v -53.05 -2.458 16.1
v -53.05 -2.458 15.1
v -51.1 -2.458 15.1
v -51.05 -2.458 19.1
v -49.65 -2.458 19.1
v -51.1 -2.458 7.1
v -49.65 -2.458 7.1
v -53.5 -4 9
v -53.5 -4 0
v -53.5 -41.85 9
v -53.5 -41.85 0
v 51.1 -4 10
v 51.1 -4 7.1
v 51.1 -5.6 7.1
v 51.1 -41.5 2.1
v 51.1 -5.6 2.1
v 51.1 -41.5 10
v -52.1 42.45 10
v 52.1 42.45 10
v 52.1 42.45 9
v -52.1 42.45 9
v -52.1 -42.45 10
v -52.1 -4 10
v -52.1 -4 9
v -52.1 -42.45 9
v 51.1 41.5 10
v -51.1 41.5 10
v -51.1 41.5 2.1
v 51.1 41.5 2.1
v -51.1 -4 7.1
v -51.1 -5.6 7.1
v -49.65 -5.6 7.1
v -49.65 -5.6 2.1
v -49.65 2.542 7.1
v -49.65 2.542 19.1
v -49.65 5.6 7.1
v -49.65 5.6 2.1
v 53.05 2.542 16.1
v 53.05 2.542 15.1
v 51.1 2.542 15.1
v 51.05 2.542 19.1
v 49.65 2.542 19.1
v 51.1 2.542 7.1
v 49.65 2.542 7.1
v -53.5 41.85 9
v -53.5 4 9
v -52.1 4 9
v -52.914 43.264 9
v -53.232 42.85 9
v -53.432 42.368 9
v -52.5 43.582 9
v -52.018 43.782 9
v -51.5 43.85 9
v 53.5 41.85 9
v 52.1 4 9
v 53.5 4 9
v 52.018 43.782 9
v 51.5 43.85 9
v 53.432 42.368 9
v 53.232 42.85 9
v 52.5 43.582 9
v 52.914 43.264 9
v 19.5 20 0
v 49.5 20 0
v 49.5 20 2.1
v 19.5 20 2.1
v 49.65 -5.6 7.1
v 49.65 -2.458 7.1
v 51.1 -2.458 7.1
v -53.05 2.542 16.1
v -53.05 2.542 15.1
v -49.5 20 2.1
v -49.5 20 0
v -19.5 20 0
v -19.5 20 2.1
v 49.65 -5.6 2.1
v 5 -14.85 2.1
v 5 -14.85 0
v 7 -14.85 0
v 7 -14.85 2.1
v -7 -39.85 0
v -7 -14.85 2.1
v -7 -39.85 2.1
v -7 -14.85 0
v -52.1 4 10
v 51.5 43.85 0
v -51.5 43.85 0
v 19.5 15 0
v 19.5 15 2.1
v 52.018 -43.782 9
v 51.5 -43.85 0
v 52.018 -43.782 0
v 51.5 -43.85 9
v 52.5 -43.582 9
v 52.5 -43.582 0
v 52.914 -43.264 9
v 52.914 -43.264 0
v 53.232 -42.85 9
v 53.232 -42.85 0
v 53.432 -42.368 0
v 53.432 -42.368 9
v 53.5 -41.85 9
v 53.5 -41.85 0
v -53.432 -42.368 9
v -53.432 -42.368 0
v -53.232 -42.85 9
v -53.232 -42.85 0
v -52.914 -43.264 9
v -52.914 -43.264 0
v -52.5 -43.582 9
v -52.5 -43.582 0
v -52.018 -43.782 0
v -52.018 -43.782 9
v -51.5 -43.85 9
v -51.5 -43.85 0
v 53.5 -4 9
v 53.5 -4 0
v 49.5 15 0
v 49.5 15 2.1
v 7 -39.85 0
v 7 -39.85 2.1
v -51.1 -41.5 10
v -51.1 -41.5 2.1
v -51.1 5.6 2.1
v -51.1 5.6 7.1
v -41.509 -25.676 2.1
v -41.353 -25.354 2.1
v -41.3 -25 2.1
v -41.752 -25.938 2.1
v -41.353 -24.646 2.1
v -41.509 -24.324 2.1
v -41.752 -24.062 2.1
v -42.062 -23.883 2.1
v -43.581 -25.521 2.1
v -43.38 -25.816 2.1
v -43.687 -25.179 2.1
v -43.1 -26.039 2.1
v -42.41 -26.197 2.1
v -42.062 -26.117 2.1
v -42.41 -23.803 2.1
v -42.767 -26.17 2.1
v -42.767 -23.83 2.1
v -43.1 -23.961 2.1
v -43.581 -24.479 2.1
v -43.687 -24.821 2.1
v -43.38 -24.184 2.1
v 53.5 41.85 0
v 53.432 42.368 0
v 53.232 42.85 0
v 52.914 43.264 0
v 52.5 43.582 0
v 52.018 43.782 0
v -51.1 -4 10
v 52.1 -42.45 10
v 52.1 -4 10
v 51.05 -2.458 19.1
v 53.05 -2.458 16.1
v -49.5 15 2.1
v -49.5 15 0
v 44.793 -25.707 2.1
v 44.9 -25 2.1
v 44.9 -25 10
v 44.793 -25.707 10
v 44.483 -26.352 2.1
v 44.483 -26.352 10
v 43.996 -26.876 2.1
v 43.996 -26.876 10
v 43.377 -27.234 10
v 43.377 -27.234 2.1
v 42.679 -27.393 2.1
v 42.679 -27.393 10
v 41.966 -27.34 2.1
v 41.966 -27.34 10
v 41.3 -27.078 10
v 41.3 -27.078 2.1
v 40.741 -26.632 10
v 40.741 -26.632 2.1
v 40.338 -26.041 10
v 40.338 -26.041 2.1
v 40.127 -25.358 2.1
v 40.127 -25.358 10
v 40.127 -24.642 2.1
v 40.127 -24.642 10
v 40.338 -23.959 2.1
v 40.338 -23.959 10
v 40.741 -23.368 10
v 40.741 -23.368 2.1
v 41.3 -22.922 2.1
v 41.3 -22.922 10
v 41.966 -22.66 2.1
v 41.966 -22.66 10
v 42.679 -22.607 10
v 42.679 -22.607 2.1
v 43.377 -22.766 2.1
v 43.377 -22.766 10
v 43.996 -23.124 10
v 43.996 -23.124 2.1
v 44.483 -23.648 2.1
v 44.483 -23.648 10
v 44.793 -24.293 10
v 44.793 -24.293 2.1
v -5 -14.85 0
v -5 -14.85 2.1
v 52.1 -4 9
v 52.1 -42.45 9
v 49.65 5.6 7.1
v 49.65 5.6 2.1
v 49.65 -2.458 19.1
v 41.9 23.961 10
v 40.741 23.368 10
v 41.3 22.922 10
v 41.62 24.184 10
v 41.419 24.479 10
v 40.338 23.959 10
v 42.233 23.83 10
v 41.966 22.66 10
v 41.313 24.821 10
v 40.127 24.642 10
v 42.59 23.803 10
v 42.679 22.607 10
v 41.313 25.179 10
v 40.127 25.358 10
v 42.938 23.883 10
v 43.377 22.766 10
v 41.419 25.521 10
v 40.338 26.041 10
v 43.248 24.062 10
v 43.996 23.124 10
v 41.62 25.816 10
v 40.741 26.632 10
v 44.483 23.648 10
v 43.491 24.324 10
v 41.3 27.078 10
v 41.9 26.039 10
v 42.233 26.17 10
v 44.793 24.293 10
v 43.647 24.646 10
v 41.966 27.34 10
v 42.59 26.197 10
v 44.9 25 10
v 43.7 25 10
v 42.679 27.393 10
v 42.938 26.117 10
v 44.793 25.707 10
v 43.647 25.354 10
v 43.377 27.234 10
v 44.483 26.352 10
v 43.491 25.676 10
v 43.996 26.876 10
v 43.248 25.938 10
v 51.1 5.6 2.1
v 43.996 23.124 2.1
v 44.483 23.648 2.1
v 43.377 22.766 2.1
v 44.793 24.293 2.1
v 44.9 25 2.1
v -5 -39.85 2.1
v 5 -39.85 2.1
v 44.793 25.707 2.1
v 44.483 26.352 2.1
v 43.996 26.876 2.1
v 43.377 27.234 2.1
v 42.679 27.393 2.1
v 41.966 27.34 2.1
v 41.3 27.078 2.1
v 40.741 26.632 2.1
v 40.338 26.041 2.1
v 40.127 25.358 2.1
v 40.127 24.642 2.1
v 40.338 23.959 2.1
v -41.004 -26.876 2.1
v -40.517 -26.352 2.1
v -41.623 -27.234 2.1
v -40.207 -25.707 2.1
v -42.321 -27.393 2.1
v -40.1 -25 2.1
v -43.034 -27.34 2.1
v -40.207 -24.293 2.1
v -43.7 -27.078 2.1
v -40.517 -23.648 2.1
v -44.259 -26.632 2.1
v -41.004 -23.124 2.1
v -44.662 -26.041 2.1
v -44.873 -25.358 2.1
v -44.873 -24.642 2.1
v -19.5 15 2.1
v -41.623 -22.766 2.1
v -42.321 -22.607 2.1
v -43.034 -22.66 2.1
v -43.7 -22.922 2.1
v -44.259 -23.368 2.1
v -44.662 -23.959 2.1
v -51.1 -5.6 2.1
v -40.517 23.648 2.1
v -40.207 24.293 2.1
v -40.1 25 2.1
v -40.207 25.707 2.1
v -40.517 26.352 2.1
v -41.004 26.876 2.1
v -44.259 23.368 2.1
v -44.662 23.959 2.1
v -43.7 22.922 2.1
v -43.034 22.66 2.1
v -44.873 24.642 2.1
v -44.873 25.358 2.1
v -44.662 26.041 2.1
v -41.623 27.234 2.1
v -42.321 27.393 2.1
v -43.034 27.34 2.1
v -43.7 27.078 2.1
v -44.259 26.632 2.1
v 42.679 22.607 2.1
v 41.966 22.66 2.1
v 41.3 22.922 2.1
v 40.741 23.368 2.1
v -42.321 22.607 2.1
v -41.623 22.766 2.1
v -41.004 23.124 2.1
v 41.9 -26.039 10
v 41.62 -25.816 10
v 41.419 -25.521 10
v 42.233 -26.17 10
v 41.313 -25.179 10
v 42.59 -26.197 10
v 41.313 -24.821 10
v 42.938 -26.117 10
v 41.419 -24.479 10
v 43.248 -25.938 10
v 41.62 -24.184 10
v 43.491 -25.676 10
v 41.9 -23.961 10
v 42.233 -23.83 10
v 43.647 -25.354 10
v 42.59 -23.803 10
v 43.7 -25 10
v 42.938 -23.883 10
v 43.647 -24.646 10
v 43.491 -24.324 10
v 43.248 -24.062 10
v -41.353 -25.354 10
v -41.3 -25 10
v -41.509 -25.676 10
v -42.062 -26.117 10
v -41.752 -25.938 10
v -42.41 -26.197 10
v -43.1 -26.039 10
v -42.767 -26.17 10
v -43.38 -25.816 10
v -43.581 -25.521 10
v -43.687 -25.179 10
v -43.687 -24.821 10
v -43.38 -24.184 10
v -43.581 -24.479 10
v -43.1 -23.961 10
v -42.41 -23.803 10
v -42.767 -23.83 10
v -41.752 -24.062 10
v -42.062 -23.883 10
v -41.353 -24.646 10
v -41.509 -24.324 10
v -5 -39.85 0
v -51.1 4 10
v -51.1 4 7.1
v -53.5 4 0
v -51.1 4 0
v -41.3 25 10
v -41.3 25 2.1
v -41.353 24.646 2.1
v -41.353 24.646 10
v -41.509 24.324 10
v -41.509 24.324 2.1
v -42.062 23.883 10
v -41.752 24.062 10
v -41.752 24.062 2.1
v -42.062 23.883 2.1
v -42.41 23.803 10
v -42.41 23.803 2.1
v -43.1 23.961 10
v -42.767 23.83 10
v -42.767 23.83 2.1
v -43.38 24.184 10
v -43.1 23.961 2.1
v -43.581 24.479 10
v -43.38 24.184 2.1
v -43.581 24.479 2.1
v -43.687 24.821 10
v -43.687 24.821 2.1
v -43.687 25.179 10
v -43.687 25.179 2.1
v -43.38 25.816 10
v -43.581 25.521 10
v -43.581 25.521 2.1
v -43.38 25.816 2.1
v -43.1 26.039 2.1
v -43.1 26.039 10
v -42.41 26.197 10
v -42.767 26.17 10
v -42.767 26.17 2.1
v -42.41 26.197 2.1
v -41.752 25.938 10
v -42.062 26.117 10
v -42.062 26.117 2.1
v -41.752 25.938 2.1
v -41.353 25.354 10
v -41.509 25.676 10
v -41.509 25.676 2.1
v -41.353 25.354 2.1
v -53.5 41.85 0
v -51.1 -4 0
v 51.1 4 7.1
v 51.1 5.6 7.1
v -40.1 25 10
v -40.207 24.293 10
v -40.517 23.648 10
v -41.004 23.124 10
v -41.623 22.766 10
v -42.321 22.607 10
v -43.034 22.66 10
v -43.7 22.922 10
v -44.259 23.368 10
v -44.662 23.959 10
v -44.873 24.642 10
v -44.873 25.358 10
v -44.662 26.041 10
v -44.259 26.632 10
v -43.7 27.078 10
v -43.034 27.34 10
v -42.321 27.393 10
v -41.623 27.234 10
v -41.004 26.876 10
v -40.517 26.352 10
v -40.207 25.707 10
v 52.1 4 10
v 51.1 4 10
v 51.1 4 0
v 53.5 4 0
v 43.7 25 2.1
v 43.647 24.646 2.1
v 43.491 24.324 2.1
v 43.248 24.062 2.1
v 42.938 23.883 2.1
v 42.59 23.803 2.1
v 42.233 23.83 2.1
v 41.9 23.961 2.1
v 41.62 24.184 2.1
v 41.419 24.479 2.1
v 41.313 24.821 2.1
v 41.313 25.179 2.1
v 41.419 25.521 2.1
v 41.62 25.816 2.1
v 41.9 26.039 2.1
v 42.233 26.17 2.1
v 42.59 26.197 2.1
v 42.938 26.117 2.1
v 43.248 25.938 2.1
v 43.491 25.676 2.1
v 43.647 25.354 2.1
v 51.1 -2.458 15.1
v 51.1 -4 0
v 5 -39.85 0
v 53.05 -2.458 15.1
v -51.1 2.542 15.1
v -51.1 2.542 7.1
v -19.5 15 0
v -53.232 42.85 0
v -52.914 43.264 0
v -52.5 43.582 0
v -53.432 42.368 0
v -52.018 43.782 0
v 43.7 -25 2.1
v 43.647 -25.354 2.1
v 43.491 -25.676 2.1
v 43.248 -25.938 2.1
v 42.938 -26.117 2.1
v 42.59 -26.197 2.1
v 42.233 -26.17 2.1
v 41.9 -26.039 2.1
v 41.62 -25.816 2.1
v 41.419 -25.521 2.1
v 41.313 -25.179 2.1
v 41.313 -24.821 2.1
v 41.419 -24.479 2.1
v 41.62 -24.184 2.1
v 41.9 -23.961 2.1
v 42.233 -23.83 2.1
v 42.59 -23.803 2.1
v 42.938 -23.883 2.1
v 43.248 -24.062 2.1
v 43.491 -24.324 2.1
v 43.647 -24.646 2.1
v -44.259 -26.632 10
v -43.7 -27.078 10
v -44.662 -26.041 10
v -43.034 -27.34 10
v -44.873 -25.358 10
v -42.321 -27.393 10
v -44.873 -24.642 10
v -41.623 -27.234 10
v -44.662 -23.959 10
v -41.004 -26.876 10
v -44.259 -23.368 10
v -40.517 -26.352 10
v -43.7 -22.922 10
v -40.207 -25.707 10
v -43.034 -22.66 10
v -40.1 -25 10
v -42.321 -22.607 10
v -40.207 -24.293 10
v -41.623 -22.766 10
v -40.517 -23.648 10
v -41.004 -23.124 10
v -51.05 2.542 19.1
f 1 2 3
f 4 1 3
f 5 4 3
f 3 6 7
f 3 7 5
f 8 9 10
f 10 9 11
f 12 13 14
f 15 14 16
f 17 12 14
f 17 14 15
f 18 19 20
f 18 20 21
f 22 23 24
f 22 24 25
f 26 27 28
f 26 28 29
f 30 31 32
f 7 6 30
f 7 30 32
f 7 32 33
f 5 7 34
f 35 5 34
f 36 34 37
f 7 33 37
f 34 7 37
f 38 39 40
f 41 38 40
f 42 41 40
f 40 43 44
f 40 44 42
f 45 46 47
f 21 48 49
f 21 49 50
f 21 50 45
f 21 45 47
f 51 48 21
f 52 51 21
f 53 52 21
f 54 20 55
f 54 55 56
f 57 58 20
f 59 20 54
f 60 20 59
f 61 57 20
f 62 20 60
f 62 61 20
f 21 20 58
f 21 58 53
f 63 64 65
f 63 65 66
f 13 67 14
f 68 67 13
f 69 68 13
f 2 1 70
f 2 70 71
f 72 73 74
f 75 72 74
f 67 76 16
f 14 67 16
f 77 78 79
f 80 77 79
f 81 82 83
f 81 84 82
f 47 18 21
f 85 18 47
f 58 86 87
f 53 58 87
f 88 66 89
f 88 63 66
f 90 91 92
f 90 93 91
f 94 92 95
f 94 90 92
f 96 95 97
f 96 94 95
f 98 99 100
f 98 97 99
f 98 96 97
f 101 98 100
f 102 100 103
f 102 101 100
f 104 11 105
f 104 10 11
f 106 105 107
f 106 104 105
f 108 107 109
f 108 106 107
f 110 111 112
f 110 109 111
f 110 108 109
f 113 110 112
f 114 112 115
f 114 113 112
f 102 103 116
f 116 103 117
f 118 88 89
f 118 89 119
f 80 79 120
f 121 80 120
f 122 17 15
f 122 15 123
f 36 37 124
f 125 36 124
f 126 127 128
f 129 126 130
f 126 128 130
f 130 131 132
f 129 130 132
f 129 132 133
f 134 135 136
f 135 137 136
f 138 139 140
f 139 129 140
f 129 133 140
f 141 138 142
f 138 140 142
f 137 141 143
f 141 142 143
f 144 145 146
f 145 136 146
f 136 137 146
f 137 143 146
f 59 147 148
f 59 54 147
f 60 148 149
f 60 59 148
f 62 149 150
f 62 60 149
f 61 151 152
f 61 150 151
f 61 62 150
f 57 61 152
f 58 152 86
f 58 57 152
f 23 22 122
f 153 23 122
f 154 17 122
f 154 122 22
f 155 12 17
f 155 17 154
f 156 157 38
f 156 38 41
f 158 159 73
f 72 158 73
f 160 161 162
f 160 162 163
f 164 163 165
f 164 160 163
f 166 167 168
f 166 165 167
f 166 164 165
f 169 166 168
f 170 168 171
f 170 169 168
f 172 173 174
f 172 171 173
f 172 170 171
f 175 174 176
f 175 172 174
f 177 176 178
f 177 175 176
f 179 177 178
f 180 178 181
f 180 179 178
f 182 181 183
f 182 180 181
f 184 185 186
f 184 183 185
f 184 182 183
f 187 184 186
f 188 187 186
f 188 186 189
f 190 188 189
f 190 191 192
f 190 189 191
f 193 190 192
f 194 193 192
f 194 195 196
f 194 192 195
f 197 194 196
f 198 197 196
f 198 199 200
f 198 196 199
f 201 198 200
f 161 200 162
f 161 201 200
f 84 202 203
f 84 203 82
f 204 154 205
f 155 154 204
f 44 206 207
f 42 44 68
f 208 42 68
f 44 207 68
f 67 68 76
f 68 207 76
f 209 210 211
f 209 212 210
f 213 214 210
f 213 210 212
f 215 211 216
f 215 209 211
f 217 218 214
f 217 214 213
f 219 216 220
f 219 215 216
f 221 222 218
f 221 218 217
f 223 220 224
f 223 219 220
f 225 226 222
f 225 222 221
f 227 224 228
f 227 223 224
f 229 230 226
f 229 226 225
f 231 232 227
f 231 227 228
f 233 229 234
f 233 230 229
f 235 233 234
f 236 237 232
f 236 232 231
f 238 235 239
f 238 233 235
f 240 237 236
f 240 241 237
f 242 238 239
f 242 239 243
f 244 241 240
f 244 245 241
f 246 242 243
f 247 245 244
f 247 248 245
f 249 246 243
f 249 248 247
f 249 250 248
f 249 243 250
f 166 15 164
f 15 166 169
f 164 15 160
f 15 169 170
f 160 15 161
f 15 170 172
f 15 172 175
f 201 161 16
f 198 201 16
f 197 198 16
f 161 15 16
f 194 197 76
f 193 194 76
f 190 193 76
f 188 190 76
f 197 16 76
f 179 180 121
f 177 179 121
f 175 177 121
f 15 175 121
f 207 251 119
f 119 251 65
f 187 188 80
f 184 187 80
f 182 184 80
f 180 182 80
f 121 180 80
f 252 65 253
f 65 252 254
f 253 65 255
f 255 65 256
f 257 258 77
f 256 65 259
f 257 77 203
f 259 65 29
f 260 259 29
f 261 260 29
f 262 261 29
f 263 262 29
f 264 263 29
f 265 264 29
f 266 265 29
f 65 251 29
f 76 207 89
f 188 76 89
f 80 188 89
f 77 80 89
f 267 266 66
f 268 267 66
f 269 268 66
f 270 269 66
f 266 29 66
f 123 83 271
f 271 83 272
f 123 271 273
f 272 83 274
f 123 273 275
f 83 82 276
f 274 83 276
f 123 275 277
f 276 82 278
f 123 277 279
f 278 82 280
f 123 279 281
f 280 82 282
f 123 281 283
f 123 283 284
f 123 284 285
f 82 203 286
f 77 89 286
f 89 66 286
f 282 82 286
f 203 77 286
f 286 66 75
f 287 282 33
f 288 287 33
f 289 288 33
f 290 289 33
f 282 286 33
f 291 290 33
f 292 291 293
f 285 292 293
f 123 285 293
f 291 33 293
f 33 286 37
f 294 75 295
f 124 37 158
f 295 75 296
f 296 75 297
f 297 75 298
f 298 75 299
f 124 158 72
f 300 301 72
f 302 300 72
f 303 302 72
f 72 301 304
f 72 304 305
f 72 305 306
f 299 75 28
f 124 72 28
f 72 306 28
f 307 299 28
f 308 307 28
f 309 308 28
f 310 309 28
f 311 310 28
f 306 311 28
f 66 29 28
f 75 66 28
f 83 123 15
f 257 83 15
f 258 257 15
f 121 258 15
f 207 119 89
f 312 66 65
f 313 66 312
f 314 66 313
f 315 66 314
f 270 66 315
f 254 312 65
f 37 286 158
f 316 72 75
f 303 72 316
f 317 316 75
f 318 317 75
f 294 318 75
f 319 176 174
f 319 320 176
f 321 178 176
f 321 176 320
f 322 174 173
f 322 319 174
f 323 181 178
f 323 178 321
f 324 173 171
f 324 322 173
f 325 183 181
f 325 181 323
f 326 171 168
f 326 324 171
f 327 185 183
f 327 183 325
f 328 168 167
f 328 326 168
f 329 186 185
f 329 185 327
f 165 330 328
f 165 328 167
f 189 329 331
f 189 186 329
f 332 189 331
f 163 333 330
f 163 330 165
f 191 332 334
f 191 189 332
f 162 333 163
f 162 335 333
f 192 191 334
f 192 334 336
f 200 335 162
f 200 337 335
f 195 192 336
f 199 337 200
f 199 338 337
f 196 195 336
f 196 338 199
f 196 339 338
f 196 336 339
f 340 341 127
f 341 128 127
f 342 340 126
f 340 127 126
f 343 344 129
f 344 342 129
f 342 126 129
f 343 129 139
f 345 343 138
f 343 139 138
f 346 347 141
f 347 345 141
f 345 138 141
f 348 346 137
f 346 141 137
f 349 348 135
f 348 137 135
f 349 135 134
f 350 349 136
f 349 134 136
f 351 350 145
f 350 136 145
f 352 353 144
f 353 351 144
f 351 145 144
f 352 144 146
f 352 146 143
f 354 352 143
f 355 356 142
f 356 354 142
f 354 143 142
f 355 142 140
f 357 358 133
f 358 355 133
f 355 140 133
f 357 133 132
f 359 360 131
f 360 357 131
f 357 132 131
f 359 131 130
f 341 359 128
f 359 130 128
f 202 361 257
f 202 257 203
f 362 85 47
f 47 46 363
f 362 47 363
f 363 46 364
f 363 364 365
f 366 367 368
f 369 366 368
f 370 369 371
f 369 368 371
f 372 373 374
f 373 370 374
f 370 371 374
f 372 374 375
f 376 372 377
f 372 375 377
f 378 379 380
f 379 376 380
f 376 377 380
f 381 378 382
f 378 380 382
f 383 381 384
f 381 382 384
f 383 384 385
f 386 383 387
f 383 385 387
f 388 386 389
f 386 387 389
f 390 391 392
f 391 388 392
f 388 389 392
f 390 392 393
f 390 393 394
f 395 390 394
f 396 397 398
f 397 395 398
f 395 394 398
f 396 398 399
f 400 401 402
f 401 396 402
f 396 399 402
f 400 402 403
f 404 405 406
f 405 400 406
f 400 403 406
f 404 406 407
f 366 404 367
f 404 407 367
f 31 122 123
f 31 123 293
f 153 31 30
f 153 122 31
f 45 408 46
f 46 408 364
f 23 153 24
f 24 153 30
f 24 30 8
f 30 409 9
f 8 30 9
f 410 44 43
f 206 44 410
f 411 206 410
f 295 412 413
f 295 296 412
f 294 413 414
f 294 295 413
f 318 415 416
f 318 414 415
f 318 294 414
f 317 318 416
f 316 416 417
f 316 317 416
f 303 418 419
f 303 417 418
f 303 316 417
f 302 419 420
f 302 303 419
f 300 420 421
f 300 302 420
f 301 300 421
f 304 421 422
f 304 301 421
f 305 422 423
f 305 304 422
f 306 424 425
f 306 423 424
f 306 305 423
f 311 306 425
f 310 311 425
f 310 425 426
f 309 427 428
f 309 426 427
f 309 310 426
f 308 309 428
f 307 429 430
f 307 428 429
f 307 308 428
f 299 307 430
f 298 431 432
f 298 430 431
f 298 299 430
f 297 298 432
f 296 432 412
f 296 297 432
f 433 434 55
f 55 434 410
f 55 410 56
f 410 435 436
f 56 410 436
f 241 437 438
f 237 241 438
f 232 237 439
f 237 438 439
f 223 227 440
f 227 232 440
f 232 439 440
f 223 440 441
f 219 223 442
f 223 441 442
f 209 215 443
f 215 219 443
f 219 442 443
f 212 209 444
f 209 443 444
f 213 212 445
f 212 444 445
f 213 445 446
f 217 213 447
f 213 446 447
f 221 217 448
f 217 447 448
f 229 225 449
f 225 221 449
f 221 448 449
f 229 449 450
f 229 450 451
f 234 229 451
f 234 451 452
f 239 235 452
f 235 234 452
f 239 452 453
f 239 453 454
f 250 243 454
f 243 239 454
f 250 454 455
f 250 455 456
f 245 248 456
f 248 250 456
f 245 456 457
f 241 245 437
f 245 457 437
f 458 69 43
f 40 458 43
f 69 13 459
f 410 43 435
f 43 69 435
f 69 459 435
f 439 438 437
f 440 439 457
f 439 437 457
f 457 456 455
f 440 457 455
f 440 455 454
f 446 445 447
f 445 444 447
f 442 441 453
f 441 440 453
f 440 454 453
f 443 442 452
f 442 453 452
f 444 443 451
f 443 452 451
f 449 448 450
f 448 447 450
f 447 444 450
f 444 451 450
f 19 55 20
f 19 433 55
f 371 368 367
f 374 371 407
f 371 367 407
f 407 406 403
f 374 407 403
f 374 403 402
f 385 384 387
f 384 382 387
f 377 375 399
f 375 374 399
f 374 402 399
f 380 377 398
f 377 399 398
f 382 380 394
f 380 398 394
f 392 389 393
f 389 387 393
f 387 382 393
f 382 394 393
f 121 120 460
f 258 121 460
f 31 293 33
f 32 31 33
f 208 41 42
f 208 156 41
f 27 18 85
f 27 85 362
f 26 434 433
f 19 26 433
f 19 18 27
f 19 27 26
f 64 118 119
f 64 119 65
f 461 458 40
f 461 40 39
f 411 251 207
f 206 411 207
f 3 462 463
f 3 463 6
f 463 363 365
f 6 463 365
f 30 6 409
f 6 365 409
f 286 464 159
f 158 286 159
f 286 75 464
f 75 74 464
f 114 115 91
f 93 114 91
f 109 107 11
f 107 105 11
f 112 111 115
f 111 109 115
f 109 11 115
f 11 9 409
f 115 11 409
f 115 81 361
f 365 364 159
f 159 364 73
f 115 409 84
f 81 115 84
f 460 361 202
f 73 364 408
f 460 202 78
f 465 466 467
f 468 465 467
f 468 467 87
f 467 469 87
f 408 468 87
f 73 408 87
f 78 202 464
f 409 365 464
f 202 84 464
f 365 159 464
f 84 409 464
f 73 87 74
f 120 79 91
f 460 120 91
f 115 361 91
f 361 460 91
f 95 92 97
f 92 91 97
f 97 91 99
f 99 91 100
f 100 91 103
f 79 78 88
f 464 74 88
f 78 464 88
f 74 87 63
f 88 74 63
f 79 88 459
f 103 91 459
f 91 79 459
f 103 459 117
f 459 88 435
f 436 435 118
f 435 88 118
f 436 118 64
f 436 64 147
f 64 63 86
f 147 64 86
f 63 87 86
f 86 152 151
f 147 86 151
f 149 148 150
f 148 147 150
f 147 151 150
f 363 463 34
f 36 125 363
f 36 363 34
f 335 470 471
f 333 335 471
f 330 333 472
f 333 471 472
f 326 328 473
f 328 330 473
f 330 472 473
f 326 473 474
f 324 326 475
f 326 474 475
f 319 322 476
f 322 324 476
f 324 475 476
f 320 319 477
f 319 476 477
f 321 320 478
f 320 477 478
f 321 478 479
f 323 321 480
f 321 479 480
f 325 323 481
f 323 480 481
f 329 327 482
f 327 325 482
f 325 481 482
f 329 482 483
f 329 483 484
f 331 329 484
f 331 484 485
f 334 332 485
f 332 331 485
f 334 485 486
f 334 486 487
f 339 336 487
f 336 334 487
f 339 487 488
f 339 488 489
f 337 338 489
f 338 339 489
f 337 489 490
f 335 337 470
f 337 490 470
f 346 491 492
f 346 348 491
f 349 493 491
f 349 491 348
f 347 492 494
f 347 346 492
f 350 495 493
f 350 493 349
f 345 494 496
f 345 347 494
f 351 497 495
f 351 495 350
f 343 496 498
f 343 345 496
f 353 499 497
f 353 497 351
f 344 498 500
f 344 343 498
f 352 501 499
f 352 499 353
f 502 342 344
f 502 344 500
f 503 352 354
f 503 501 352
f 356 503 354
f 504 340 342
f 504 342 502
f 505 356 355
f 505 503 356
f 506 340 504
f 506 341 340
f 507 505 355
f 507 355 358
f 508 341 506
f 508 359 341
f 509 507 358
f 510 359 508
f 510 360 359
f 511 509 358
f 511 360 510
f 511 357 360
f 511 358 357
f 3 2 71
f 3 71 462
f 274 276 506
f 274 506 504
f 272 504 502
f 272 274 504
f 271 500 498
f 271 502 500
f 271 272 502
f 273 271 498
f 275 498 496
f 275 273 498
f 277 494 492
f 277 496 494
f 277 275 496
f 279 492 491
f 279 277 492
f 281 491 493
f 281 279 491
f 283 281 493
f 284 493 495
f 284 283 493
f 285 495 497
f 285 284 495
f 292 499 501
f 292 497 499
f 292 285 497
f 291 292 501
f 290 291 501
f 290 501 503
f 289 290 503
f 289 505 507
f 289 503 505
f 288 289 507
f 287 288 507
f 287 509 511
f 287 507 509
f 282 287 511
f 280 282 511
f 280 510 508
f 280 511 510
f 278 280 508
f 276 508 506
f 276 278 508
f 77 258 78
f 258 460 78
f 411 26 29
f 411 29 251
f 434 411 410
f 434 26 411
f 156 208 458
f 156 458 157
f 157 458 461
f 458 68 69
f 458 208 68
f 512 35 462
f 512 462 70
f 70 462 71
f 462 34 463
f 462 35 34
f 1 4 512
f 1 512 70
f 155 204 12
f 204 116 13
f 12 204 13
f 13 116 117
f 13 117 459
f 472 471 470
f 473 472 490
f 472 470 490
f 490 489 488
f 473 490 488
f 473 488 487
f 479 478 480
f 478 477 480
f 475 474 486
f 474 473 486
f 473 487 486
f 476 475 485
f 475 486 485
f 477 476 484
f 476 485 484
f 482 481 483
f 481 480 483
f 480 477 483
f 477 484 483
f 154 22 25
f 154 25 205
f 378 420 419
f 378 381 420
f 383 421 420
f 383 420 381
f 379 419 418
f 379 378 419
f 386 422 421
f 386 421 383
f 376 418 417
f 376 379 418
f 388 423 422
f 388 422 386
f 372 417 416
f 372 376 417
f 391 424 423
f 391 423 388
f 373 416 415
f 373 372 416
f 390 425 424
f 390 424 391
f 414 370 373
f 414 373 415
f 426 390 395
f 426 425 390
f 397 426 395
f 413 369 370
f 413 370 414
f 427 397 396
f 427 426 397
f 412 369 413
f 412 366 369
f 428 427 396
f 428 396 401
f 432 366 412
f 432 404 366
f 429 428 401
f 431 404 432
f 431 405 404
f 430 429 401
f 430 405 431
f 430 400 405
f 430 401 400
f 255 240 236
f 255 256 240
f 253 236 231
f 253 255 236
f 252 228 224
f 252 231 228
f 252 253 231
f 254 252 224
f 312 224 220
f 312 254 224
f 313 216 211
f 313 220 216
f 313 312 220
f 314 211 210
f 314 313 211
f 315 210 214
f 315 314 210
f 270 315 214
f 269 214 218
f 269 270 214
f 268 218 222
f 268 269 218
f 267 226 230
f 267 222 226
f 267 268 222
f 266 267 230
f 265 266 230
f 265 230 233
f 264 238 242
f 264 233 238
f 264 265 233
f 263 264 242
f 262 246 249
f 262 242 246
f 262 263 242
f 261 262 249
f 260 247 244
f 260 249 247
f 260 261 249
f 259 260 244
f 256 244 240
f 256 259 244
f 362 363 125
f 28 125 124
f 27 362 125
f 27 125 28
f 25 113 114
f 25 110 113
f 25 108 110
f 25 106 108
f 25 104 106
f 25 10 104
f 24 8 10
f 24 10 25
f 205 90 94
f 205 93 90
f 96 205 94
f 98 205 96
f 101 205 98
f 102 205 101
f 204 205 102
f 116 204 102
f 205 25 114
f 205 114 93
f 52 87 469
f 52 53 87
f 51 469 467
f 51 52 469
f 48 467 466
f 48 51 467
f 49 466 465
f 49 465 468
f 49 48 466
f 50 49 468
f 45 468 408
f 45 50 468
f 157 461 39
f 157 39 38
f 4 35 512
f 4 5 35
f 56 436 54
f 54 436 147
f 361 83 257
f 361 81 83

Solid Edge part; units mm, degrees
sketch "Sketch1" plane through (0, 0, 0) normal (0, 0, 1) x (1, 0, 0)
  line L0 (19.5, 20) -> (19.5, 15)
  line L1 (19.5, 15) -> (49.5, 15)
  line L2 (49.5, 15) -> (49.5, 20)
  line L3 (49.5, 20) -> (19.5, 20)
  line L4 (-7, -39.85) -> (-5, -39.85)
  line L5 (-5, -39.85) -> (-5, -14.85)
  line L6 (-5, -14.85) -> (-7, -14.85)
  line L7 (-7, -14.85) -> (-7, -39.85)
  line L8 (53.5, 43.85) -> (-53.5, 43.85)
  line L9 (-53.5, 43.85) -> (-53.5, -43.85)
  line L10 (-53.5, -43.85) -> (53.5, -43.85)
  line L11 (53.5, -43.85) -> (53.5, 43.85)
  line L12 (7, -39.85) -> (5, -39.85)
  line L13 (5, -39.85) -> (5, -14.85)
  line L14 (5, -14.85) -> (7, -14.85)
  line L15 (7, -14.85) -> (7, -39.85)
  line L16 (-49.5, 20) -> (-19.5, 20)
  line L17 (-19.5, 20) -> (-19.5, 15)
  line L18 (-19.5, 15) -> (-49.5, 15)
  line L19 (-49.5, 15) -> (-49.5, 20)
  dimension "D1" = 87.7
  dimension "D2" = 107
  dimension "D3" = 4
  dimension "D4" = 25
  dimension "D5" = 5
  dimension "D6" = 2
  dimension "D7" = 30
  dimension "D8" = 5
  dimension "D9" = 4
  dimension "D10" = 15
extrude "ExtrudedProtrusion_2" add sketch "Sketch1" along normal blind 10
sketch "Sketch2" plane through (0, 0, 10) normal (0, 0, 1) x (0, 1, 0)
  line L0 (41.5, -51.1) -> (-41.5, -51.1)
  line L1 (-41.5, -51.1) -> (-41.5, 51.1)
  line L2 (-41.5, 51.1) -> (41.5, 51.1)
  line L3 (41.5, 51.1) -> (41.5, -51.1)
  line L4 (-39.85, -7) -> (-39.85, -5)
  line L5 (-39.85, -5) -> (-14.85, -5)
  line L6 (-14.85, -5) -> (-14.85, -7)
  line L7 (-14.85, -7) -> (-39.85, -7)
  line L8 (15, 49.5) -> (20, 49.5)
  line L9 (20, 49.5) -> (20, 19.5)
  line L10 (20, 19.5) -> (15, 19.5)
  line L11 (15, 19.5) -> (15, 49.5)
  line L12 (-14.85, 5) -> (-14.85, 7)
  line L13 (-14.85, 7) -> (-39.85, 7)
  line L14 (-39.85, 7) -> (-39.85, 5)
  line L15 (-39.85, 5) -> (-14.85, 5)
  line L16 (15, -49.5) -> (20, -49.5)
  line L17 (20, -49.5) -> (20, -19.5)
  line L18 (20, -19.5) -> (15, -19.5)
  line L19 (15, -19.5) -> (15, -49.5)
extrude "ExtrudedCutout_1" cut sketch "Sketch2" against normal blind 7.9
sketch "Sketch3" plane through (0, 0, 10) normal (0, 0, 1) x (1, 0, 0)
  line L0 (-52.1, 42.45) -> (-52.1, -42.45)
  line L1 (-52.1, -42.45) -> (52.1, -42.45)
  line L2 (52.1, -42.45) -> (52.1, 42.45)
  line L3 (52.1, 42.45) -> (-52.1, 42.45)
  line L4 (53.5, 43.85) -> (-53.5, 43.85)
  line L5 (-53.5, 43.85) -> (-53.5, -43.85)
  line L6 (-53.5, -43.85) -> (53.5, -43.85)
  line L7 (53.5, -43.85) -> (53.5, 43.85)
  dimension "D1" = 104.2
  dimension "D2" = 84.9
  dimension "D3" = 87.7
  dimension "D4" = 107
extrude "ExtrudedCutout_2" cut sketch "Sketch3" against normal blind 1
sketch "Sketch4" plane through (0, 0, 2.1) normal (0, 0, 1) x (1, 0, 0)
  line L0 (-49.65, -5.6) -> (-49.65, 5.6)
  line L1 (-49.65, 5.6) -> (-51.1, 5.6)
  line L2 (-51.1, 5.6) -> (-51.1, -5.6)
  line L3 (-51.1, -5.6) -> (-49.65, -5.6)
extrude "ExtrudedProtrusion_3" add sketch "Sketch4" along normal blind 5
mirror "Mirror1" about plane through (0, 0, 0) normal (1, 0, 0) of "ExtrudedProtrusion_3"
sketch "Sketch5" plane through (-50.375, 0, 7.1) normal (0, 0, 1) x (0, 1, 0)
  line L0 (-2.4577, -0.725) -> (2.5423, -0.725)
  line L1 (2.5423, -0.725) -> (2.5423, 0.725)
  line L2 (2.5423, 0.725) -> (-2.4577, 0.725)
  line L3 (-2.4577, 0.725) -> (-2.4577, -0.725)
extrude "ExtrudedProtrusion_4" add sketch "Sketch5" along normal blind 8
mirror "Mirror2" about plane through (0, 0, 0) normal (1, 0, 0) of "ExtrudedProtrusion_4"
sketch "Sketch6" plane through (-50.375, -2.4577, 11.1) normal (0, -1, 0) x (0, 0, 1)
  line L0 (4, 2.675) -> (4, -0.725)
  line L1 (4, -0.725) -> (8, -0.725)
  line L2 (8, -0.725) -> (8, 0.675)
  line L3 (8, 0.675) -> (5, 2.675)
  line L4 (5, 2.675) -> (4, 2.675)
extrude "ExtrudedProtrusion_5" add sketch "Sketch6" against normal blind 5
mirror "Mirror3" about plane through (0, 0, 0) normal (1, 0, 0) of "ExtrudedProtrusion_5"
sketch "Sketch7" plane through (0, 0, 0) normal (0, 0, -1) x (0, 1, 0)
  line L0 (-4, 51.1) -> (4, 51.1)
  line L1 (4, 51.1) -> (4, 53.5)
  line L2 (4, 53.5) -> (-4, 53.5)
  line L3 (-4, 53.5) -> (-4, 51.1)
extrude "ExtrudedCutout_4" cut sketch "Sketch7" against normal blind 10
mirror "Mirror4" about plane through (0, 0, 0) normal (1, 0, 0) of "ExtrudedCutout_4"
sketch "Sketch8" plane through (0, 0, 2.1) normal (0, 0, 1) x (1, 0, 0)
  circle A0 centre (42.5, -25) radius 1.2
  circle A1 centre (42.5, -25) radius 2.4
  circle A2 centre (-42.5, -25) radius 2.4
  circle A3 centre (-42.5, -25) radius 1.2
  circle A4 centre (-42.5, 25) radius 1.2
  circle A5 centre (-42.5, 25) radius 2.4
  circle A6 centre (42.5, 25) radius 2.4
  circle A7 centre (42.5, 25) radius 1.2
  dimension "D1" = 42.5
  dimension "D2" = 25
  dimension "D3" = 2.4
extrude "ExtrudedProtrusion_6" add sketch "Sketch8" along normal blind 7.9
fillet "Round_1" radius 2 4 edges at (53.5, -43.85, 4.5) (53.5, 43.85, 4.5) (-53.5, 43.85, 4.5) (-53.5, -43.85, 4.5)
